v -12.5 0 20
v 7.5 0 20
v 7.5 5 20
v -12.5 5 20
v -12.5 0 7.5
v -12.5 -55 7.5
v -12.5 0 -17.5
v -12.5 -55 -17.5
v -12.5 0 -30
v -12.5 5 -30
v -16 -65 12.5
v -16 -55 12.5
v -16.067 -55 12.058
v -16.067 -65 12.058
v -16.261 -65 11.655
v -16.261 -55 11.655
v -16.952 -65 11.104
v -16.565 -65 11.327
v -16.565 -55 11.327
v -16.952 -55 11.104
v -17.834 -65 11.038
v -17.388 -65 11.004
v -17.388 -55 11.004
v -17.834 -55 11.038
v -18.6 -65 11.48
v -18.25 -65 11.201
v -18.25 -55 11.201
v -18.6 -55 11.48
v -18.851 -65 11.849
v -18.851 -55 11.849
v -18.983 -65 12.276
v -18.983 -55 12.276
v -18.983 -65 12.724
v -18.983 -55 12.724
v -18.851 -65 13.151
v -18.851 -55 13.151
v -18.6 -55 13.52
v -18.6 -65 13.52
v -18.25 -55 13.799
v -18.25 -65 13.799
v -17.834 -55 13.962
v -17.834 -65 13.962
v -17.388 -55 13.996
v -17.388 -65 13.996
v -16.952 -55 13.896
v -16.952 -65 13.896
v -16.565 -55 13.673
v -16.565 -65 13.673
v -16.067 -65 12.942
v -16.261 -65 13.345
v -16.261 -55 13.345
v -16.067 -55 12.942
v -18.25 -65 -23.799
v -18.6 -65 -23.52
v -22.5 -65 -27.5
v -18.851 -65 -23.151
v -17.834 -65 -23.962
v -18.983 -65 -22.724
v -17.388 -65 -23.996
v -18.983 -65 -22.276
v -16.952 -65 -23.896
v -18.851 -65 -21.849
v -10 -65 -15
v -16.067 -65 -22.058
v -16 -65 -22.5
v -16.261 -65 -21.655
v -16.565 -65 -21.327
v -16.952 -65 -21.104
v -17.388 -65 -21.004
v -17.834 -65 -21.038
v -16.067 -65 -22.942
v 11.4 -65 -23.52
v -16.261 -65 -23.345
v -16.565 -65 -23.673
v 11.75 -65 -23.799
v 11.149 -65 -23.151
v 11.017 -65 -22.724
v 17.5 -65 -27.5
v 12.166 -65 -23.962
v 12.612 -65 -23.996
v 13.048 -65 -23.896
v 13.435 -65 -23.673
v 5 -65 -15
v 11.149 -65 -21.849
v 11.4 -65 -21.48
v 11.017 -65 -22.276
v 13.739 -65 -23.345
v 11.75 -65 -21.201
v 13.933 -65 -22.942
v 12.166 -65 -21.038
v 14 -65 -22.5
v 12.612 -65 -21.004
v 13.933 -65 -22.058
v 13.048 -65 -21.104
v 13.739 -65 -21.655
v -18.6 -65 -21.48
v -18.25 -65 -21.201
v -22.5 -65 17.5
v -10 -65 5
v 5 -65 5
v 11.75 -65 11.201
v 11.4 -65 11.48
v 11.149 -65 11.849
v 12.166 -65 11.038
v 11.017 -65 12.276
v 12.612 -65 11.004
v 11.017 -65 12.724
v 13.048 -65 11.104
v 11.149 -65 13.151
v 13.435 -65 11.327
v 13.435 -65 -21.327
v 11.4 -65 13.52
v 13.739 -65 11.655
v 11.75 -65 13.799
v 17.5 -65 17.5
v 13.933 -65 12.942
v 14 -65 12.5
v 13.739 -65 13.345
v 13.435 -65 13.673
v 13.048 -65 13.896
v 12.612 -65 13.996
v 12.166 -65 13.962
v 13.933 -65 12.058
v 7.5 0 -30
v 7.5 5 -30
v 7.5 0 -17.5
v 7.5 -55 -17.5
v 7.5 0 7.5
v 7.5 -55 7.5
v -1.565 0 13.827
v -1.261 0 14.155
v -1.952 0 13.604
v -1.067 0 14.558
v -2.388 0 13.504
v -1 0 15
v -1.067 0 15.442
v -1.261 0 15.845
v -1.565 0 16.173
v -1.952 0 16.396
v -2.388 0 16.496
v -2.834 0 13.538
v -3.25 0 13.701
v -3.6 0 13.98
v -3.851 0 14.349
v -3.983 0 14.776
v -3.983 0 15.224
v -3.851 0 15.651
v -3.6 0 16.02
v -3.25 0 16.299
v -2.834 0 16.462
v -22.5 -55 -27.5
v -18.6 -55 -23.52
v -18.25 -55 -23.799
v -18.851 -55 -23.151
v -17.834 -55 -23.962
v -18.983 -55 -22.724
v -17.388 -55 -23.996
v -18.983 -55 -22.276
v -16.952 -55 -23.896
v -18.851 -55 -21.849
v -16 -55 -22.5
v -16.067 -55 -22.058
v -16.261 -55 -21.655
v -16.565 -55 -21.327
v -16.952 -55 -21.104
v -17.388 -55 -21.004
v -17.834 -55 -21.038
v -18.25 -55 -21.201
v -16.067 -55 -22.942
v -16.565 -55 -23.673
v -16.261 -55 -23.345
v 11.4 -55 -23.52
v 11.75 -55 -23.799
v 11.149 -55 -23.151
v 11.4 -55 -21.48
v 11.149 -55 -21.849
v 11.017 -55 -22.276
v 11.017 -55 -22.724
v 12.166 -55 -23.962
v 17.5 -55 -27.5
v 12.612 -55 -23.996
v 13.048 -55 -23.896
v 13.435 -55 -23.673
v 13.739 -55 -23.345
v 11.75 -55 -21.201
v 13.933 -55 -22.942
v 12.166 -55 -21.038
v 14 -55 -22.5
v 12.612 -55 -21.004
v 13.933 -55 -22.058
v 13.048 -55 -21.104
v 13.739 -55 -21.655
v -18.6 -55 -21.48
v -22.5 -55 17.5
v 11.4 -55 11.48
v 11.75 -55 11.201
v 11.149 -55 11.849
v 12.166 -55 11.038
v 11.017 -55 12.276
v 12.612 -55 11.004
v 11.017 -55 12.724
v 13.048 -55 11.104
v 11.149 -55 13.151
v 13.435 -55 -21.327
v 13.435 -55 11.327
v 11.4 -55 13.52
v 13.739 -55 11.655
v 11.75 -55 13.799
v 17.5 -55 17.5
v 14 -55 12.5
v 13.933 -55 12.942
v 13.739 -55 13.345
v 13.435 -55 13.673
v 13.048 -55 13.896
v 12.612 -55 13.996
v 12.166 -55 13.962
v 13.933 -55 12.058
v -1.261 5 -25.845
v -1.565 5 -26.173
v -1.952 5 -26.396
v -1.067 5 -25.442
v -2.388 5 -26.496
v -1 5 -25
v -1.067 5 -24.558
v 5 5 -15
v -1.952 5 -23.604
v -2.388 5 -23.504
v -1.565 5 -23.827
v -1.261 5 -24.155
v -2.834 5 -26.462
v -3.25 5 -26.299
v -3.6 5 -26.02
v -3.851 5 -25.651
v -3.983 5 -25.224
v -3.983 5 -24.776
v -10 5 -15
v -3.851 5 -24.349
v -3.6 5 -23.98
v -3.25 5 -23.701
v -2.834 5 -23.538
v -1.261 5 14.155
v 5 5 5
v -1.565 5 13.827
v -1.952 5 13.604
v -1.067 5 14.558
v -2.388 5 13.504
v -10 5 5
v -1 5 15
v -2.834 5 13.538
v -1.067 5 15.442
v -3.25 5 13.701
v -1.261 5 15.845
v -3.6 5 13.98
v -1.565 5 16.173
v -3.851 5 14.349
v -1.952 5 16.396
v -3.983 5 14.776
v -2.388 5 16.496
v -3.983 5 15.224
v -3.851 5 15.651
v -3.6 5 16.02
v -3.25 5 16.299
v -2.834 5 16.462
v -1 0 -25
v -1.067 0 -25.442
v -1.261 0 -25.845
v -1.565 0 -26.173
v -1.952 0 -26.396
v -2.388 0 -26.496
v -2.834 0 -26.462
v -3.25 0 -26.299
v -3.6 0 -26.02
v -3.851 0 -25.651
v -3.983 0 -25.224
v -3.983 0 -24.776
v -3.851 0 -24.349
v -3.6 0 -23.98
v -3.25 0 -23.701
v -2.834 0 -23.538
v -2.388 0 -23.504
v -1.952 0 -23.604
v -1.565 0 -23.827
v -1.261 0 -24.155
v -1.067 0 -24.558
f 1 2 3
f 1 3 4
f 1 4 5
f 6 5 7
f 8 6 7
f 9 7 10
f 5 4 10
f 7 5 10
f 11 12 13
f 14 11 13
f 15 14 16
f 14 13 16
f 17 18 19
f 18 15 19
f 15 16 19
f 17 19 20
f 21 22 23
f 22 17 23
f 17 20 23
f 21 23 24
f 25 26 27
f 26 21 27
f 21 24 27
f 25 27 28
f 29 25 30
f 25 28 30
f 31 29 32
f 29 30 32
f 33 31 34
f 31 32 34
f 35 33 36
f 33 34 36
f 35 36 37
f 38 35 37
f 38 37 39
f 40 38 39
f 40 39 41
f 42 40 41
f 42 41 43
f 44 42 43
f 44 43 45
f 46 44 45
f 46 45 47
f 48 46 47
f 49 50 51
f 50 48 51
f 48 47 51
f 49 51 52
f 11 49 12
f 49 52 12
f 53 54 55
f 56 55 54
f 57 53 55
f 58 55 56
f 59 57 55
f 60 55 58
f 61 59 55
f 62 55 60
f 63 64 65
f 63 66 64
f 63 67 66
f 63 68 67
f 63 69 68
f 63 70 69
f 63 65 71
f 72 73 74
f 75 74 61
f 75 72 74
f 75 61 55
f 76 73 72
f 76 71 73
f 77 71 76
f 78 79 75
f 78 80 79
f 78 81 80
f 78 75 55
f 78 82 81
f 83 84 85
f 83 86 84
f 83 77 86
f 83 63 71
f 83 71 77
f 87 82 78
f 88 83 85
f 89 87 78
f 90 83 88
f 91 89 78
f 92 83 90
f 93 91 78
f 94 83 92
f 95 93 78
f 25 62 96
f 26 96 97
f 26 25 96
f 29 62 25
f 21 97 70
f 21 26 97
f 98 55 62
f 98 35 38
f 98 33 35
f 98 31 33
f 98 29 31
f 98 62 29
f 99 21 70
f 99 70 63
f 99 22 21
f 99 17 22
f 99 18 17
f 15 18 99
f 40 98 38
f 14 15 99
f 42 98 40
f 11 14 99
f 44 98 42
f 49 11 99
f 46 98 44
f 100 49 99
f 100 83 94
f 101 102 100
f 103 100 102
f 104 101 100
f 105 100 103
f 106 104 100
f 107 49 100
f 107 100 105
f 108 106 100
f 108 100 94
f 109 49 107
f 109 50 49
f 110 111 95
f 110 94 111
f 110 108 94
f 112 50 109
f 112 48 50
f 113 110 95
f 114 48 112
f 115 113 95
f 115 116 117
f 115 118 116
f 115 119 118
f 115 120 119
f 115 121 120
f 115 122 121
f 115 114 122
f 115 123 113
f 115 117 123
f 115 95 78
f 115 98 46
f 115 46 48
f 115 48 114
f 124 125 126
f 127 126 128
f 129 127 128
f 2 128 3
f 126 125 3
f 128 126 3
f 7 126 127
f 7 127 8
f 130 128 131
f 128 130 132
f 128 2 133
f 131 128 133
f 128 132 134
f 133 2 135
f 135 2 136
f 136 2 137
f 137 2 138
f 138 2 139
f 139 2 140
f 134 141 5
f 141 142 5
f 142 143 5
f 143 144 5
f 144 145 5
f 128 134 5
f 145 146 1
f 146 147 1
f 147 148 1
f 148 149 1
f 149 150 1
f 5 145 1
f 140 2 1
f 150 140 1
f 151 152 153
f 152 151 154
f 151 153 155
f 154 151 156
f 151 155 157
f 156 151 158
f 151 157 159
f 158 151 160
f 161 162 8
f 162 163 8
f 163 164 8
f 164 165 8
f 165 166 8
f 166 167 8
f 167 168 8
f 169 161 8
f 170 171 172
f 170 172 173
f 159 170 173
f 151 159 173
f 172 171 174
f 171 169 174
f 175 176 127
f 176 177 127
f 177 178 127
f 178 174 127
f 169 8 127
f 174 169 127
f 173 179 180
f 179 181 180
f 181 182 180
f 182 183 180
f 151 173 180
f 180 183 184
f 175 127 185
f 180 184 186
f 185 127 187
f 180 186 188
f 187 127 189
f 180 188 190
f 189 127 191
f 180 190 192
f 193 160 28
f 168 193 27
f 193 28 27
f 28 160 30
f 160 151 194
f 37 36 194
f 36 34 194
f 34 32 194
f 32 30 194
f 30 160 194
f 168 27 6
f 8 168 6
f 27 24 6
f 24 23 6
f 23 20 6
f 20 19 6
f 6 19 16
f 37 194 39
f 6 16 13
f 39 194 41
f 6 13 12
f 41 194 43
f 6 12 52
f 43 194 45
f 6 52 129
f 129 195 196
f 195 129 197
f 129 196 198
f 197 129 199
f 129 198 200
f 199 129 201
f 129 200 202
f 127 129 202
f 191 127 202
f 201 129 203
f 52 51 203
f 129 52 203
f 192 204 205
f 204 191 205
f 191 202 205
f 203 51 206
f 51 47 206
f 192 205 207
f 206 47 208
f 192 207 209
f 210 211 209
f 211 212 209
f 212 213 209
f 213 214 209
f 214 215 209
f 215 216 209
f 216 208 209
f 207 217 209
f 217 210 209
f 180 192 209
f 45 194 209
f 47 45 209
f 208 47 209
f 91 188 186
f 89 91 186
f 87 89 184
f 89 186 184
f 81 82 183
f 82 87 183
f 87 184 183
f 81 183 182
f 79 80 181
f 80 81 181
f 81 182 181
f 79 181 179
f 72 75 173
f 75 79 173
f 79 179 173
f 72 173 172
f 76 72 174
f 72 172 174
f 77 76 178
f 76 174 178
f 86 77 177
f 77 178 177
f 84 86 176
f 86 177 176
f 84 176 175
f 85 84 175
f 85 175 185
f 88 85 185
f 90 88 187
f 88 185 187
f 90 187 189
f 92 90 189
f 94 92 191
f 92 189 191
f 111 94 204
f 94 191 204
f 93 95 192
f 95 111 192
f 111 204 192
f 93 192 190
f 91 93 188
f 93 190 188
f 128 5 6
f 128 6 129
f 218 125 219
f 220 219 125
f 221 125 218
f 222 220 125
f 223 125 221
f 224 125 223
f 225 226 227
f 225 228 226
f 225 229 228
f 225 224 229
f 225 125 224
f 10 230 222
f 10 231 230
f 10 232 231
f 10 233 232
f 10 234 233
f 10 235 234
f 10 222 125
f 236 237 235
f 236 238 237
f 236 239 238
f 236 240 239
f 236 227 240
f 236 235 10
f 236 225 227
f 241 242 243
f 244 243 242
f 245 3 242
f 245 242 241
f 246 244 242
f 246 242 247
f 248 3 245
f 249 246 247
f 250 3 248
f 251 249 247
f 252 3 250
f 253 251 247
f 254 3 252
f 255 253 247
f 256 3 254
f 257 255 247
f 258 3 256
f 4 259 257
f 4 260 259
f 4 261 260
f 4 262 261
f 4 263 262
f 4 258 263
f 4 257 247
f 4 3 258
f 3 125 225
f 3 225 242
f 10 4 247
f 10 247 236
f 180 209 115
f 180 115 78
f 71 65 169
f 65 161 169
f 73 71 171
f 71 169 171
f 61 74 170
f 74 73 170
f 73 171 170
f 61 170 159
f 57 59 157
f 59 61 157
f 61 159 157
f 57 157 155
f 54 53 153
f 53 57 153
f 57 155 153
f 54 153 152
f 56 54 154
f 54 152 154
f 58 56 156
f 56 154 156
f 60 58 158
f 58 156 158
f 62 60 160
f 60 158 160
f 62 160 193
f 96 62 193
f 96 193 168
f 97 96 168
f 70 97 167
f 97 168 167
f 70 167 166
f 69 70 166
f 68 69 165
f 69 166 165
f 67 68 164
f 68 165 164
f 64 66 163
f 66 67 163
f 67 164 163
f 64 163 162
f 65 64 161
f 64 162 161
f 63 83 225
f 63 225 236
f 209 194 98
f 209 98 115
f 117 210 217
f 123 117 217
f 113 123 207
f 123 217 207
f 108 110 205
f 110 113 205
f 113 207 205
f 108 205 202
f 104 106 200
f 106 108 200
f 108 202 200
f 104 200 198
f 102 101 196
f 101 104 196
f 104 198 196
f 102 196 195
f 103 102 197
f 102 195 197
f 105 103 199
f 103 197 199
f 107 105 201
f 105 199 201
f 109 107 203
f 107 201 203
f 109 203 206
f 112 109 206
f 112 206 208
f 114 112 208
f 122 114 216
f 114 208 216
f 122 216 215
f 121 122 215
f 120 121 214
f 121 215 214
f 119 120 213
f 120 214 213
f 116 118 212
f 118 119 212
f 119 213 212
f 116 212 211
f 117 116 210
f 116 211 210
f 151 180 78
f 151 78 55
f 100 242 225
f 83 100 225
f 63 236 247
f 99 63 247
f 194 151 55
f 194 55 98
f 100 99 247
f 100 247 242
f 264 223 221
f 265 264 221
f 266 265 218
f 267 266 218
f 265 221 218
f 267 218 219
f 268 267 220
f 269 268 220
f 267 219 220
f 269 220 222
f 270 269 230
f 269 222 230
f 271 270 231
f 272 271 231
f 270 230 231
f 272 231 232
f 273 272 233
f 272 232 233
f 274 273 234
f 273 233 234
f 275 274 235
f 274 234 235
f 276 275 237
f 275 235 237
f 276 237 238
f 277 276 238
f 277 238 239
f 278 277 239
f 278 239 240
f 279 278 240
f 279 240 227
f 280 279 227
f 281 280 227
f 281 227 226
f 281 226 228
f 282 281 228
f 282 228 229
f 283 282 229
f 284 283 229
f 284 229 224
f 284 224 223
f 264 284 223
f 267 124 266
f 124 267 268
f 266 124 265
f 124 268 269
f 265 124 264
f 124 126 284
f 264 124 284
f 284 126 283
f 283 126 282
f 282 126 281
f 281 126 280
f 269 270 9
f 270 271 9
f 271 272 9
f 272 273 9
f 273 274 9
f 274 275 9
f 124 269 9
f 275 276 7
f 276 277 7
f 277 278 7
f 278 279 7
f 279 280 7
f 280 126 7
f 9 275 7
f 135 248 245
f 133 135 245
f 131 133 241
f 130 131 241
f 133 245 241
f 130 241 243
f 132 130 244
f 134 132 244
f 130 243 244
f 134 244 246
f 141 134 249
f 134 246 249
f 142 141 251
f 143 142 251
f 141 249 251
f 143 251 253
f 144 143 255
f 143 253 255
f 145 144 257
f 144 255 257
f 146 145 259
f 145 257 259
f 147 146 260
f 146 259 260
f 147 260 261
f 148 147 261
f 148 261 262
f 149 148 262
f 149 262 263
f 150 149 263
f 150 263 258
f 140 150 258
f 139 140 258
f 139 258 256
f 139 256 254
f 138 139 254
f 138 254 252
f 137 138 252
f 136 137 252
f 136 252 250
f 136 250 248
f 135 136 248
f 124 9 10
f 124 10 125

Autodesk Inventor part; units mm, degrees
ref_plane "YZ Plane" through (0, 0, 0) normal (1, 0, 0) x (0, 1, 0)
ref_plane "XZ Plane" through (0, 0, 0) normal (0, 1, 0) x (-1, 0, 0)
ref_plane "XY Plane" through (0, 0, 0) normal (0, 0, 1) x (1, 0, 0)
sketch "Sketch1" plane through (0, 0, 0) normal (0, 1, 0) x (-1, 0, 0)
  line L0 (0, 0) -> (5, 0)
  line L1 (5, 0) -> (5, -10)
  line L2 (5, -10) -> (0, -10)
  line L3 (0, -10) -> (0, 0)
  line L4 (-7.5, 20) -> (12.5, 20)
  line L5 (12.5, 20) -> (12.5, -30)
  line L6 (12.5, -30) -> (-7.5, -30)
  line L7 (-7.5, -30) -> (-7.5, 20)
  line L8 (-7.5, 20) -> (12.5, -30) construction
  line L9 (12.5, 20) -> (-7.5, -30) construction
  line L10 (12.5, -17.5) -> (12.5, 7.5)
  line L11 (12.5, 7.5) -> (-7.5, 7.5)
  line L12 (-7.5, 7.5) -> (-7.5, -17.5)
  line L13 (-7.5, -17.5) -> (12.5, -17.5)
  point P0 (2.5, -5)
  point P1 (-7.5, 7.5)
  dimension "d0" = 5
  dimension "d1" = 10
  dimension "d2" = 20
  dimension "d3" = 50
  dimension "d4" = 7.5
  dimension "d5" = 20
  dimension "d6" = 7.5
extrude "Extrusion1" add sketch "Sketch1" along normal blind 5
extrude "Extrusion2" add sketch "Sketch1" against normal blind 55 contours L11 L5 L13 L7
sketch "Sketch2" plane through (0, -55, 0) normal (0, -1, 0) x (1, 0, 0)
  line L0 (-12.5, 7.5) -> (-12.5, -17.5) projected
  line L1 (-12.5, -17.5) -> (7.5, -17.5) projected
  line L2 (7.5, -17.5) -> (7.5, 7.5) projected
  line L3 (7.5, 7.5) -> (-12.5, 7.5) projected
  line L4 (-5, 0) -> (0, 0) projected
  line L5 (0, 0) -> (0, -10) projected
  line L6 (0, -10) -> (-5, -10) projected
  line L7 (-5, -10) -> (-5, 0) projected
  line L8 (17.5, 17.5) -> (17.5, -27.5)
  line L9 (17.5, -27.5) -> (-22.5, -27.5)
  line L10 (-22.5, -27.5) -> (-22.5, 17.5)
  line L11 (-22.5, 17.5) -> (17.5, 17.5)
  line L12 (12.5, -22.5) -> (12.5, 12.5) construction
  line L13 (12.5, 12.5) -> (-17.5, 12.5) construction
  line L14 (-17.5, 12.5) -> (-17.5, -22.5) construction
  line L15 (-17.5, -22.5) -> (12.5, -22.5) construction
  circle A0 centre (12.5, 12.5) radius 1.5
  circle A1 centre (12.5, -22.5) radius 1.5
  circle A2 centre (-17.5, 12.5) radius 1.5
  circle A3 centre (-17.5, -22.5) radius 1.5
  dimension "d11" = 10
  dimension "d12" = 5
  dimension "d13" = 3
  dimension "d14" = 3
  dimension "d15" = 3
  dimension "d16" = 3
extrude "Extrusion3" add sketch "Sketch2" along normal blind 10 contours L8 L9 L10 L11
sketch "Sketch3" plane through (0, 5, 0) normal (0, 1, 0) x (1, 0, 0)
  line L0 (7.5, -20) -> (7.5, 30) projected
  line L1 (7.5, 30) -> (-12.5, 30) projected
  line L2 (-12.5, 30) -> (-12.5, -20) projected
  line L3 (-12.5, -20) -> (7.5, -20) projected
  line L4 (0, 0) -> (-5, 0) projected
  line L5 (-5, 0) -> (-5, 10) projected
  line L6 (-5, 10) -> (0, 10) projected
  line L7 (0, 10) -> (0, 0) projected
  line L8 (5, 15) -> (-10, 15)
  line L9 (-10, 15) -> (-10, -5)
  line L10 (-10, -5) -> (5, -5)
  line L11 (5, -5) -> (5, 15)
  dimension "d19" = 5
extrude "Extrusion4" cut sketch "Sketch3" against normal through all contours L11 L10 L9 L8
sketch "Sketch4" plane through (0, -55, 0) normal (0, -1, 0) x (1, 0, 0)
  line L0 (-10, 5) -> (5, 5) projected
  line L1 (5, 5) -> (5, -15) projected
  line L2 (5, -15) -> (-10, -15) projected
  line L3 (-10, -15) -> (-10, 5) projected
  line L4 (-12.5, 7.5) -> (-12.5, -17.5) projected
  line L5 (-12.5, -17.5) -> (7.5, -17.5) projected
  line L6 (7.5, -17.5) -> (7.5, 7.5) projected
  line L7 (7.5, 7.5) -> (-12.5, 7.5) projected
  point P0 (0, 0)
extrude "Extrusion5" add sketch "Sketch4" along normal blind 10
sketch "Sketch5" plane through (0, 5, 0) normal (0, 1, 0) x (1, 0, 0)
  line L0 (5, -5) -> (-10, -5) projected
  line L1 (-10, -5) -> (-10, 15) projected
  line L2 (-10, 15) -> (5, 15) projected
  line L3 (5, 15) -> (5, -5) projected
  line L4 (7.5, -20) -> (7.5, 30) projected
  line L5 (7.5, 30) -> (-12.5, 30) projected
  line L6 (-12.5, 30) -> (-12.5, -20) projected
  line L7 (-12.5, -20) -> (7.5, -20) projected
  circle A0 centre (-2.5, -15) radius 1.5
  circle A1 centre (-2.5, 25) radius 1.5
  point P0 (0, 0)
  dimension "d24" = 3
  dimension "d25" = 3
  dimension "d26" = 10
  dimension "d27" = 10
  dimension "d28" = 10
  dimension "d29" = 10
extrude "Extrusion6" cut sketch "Sketch5" against normal blind 10 contours A0 | A1
sketch "Sketch6" plane through (0, -65, 0) normal (0, -1, 0) x (1, 0, 0)
  line L0 (-10, 5) -> (5, 5) projected
  line L1 (5, 5) -> (5, -15) projected
  line L2 (5, -15) -> (-10, -15) projected
  line L3 (-10, -15) -> (-10, 5) projected
  line L4 (-22.5, 17.5) -> (-22.5, -27.5) projected
  line L5 (-22.5, -27.5) -> (17.5, -27.5) projected
  line L6 (17.5, -27.5) -> (17.5, 17.5) projected
  line L7 (17.5, 17.5) -> (-22.5, 17.5) projected
  circle A0 centre (12.5, 12.5) radius 1.5 projected
  circle A1 centre (12.5, -22.5) radius 1.5 projected
  circle A2 centre (-17.5, 12.5) radius 1.5 projected
  circle A3 centre (-17.5, -22.5) radius 1.5 projected
  point P0 (0, 0)
properties part number "select support V3_3DPrint"
